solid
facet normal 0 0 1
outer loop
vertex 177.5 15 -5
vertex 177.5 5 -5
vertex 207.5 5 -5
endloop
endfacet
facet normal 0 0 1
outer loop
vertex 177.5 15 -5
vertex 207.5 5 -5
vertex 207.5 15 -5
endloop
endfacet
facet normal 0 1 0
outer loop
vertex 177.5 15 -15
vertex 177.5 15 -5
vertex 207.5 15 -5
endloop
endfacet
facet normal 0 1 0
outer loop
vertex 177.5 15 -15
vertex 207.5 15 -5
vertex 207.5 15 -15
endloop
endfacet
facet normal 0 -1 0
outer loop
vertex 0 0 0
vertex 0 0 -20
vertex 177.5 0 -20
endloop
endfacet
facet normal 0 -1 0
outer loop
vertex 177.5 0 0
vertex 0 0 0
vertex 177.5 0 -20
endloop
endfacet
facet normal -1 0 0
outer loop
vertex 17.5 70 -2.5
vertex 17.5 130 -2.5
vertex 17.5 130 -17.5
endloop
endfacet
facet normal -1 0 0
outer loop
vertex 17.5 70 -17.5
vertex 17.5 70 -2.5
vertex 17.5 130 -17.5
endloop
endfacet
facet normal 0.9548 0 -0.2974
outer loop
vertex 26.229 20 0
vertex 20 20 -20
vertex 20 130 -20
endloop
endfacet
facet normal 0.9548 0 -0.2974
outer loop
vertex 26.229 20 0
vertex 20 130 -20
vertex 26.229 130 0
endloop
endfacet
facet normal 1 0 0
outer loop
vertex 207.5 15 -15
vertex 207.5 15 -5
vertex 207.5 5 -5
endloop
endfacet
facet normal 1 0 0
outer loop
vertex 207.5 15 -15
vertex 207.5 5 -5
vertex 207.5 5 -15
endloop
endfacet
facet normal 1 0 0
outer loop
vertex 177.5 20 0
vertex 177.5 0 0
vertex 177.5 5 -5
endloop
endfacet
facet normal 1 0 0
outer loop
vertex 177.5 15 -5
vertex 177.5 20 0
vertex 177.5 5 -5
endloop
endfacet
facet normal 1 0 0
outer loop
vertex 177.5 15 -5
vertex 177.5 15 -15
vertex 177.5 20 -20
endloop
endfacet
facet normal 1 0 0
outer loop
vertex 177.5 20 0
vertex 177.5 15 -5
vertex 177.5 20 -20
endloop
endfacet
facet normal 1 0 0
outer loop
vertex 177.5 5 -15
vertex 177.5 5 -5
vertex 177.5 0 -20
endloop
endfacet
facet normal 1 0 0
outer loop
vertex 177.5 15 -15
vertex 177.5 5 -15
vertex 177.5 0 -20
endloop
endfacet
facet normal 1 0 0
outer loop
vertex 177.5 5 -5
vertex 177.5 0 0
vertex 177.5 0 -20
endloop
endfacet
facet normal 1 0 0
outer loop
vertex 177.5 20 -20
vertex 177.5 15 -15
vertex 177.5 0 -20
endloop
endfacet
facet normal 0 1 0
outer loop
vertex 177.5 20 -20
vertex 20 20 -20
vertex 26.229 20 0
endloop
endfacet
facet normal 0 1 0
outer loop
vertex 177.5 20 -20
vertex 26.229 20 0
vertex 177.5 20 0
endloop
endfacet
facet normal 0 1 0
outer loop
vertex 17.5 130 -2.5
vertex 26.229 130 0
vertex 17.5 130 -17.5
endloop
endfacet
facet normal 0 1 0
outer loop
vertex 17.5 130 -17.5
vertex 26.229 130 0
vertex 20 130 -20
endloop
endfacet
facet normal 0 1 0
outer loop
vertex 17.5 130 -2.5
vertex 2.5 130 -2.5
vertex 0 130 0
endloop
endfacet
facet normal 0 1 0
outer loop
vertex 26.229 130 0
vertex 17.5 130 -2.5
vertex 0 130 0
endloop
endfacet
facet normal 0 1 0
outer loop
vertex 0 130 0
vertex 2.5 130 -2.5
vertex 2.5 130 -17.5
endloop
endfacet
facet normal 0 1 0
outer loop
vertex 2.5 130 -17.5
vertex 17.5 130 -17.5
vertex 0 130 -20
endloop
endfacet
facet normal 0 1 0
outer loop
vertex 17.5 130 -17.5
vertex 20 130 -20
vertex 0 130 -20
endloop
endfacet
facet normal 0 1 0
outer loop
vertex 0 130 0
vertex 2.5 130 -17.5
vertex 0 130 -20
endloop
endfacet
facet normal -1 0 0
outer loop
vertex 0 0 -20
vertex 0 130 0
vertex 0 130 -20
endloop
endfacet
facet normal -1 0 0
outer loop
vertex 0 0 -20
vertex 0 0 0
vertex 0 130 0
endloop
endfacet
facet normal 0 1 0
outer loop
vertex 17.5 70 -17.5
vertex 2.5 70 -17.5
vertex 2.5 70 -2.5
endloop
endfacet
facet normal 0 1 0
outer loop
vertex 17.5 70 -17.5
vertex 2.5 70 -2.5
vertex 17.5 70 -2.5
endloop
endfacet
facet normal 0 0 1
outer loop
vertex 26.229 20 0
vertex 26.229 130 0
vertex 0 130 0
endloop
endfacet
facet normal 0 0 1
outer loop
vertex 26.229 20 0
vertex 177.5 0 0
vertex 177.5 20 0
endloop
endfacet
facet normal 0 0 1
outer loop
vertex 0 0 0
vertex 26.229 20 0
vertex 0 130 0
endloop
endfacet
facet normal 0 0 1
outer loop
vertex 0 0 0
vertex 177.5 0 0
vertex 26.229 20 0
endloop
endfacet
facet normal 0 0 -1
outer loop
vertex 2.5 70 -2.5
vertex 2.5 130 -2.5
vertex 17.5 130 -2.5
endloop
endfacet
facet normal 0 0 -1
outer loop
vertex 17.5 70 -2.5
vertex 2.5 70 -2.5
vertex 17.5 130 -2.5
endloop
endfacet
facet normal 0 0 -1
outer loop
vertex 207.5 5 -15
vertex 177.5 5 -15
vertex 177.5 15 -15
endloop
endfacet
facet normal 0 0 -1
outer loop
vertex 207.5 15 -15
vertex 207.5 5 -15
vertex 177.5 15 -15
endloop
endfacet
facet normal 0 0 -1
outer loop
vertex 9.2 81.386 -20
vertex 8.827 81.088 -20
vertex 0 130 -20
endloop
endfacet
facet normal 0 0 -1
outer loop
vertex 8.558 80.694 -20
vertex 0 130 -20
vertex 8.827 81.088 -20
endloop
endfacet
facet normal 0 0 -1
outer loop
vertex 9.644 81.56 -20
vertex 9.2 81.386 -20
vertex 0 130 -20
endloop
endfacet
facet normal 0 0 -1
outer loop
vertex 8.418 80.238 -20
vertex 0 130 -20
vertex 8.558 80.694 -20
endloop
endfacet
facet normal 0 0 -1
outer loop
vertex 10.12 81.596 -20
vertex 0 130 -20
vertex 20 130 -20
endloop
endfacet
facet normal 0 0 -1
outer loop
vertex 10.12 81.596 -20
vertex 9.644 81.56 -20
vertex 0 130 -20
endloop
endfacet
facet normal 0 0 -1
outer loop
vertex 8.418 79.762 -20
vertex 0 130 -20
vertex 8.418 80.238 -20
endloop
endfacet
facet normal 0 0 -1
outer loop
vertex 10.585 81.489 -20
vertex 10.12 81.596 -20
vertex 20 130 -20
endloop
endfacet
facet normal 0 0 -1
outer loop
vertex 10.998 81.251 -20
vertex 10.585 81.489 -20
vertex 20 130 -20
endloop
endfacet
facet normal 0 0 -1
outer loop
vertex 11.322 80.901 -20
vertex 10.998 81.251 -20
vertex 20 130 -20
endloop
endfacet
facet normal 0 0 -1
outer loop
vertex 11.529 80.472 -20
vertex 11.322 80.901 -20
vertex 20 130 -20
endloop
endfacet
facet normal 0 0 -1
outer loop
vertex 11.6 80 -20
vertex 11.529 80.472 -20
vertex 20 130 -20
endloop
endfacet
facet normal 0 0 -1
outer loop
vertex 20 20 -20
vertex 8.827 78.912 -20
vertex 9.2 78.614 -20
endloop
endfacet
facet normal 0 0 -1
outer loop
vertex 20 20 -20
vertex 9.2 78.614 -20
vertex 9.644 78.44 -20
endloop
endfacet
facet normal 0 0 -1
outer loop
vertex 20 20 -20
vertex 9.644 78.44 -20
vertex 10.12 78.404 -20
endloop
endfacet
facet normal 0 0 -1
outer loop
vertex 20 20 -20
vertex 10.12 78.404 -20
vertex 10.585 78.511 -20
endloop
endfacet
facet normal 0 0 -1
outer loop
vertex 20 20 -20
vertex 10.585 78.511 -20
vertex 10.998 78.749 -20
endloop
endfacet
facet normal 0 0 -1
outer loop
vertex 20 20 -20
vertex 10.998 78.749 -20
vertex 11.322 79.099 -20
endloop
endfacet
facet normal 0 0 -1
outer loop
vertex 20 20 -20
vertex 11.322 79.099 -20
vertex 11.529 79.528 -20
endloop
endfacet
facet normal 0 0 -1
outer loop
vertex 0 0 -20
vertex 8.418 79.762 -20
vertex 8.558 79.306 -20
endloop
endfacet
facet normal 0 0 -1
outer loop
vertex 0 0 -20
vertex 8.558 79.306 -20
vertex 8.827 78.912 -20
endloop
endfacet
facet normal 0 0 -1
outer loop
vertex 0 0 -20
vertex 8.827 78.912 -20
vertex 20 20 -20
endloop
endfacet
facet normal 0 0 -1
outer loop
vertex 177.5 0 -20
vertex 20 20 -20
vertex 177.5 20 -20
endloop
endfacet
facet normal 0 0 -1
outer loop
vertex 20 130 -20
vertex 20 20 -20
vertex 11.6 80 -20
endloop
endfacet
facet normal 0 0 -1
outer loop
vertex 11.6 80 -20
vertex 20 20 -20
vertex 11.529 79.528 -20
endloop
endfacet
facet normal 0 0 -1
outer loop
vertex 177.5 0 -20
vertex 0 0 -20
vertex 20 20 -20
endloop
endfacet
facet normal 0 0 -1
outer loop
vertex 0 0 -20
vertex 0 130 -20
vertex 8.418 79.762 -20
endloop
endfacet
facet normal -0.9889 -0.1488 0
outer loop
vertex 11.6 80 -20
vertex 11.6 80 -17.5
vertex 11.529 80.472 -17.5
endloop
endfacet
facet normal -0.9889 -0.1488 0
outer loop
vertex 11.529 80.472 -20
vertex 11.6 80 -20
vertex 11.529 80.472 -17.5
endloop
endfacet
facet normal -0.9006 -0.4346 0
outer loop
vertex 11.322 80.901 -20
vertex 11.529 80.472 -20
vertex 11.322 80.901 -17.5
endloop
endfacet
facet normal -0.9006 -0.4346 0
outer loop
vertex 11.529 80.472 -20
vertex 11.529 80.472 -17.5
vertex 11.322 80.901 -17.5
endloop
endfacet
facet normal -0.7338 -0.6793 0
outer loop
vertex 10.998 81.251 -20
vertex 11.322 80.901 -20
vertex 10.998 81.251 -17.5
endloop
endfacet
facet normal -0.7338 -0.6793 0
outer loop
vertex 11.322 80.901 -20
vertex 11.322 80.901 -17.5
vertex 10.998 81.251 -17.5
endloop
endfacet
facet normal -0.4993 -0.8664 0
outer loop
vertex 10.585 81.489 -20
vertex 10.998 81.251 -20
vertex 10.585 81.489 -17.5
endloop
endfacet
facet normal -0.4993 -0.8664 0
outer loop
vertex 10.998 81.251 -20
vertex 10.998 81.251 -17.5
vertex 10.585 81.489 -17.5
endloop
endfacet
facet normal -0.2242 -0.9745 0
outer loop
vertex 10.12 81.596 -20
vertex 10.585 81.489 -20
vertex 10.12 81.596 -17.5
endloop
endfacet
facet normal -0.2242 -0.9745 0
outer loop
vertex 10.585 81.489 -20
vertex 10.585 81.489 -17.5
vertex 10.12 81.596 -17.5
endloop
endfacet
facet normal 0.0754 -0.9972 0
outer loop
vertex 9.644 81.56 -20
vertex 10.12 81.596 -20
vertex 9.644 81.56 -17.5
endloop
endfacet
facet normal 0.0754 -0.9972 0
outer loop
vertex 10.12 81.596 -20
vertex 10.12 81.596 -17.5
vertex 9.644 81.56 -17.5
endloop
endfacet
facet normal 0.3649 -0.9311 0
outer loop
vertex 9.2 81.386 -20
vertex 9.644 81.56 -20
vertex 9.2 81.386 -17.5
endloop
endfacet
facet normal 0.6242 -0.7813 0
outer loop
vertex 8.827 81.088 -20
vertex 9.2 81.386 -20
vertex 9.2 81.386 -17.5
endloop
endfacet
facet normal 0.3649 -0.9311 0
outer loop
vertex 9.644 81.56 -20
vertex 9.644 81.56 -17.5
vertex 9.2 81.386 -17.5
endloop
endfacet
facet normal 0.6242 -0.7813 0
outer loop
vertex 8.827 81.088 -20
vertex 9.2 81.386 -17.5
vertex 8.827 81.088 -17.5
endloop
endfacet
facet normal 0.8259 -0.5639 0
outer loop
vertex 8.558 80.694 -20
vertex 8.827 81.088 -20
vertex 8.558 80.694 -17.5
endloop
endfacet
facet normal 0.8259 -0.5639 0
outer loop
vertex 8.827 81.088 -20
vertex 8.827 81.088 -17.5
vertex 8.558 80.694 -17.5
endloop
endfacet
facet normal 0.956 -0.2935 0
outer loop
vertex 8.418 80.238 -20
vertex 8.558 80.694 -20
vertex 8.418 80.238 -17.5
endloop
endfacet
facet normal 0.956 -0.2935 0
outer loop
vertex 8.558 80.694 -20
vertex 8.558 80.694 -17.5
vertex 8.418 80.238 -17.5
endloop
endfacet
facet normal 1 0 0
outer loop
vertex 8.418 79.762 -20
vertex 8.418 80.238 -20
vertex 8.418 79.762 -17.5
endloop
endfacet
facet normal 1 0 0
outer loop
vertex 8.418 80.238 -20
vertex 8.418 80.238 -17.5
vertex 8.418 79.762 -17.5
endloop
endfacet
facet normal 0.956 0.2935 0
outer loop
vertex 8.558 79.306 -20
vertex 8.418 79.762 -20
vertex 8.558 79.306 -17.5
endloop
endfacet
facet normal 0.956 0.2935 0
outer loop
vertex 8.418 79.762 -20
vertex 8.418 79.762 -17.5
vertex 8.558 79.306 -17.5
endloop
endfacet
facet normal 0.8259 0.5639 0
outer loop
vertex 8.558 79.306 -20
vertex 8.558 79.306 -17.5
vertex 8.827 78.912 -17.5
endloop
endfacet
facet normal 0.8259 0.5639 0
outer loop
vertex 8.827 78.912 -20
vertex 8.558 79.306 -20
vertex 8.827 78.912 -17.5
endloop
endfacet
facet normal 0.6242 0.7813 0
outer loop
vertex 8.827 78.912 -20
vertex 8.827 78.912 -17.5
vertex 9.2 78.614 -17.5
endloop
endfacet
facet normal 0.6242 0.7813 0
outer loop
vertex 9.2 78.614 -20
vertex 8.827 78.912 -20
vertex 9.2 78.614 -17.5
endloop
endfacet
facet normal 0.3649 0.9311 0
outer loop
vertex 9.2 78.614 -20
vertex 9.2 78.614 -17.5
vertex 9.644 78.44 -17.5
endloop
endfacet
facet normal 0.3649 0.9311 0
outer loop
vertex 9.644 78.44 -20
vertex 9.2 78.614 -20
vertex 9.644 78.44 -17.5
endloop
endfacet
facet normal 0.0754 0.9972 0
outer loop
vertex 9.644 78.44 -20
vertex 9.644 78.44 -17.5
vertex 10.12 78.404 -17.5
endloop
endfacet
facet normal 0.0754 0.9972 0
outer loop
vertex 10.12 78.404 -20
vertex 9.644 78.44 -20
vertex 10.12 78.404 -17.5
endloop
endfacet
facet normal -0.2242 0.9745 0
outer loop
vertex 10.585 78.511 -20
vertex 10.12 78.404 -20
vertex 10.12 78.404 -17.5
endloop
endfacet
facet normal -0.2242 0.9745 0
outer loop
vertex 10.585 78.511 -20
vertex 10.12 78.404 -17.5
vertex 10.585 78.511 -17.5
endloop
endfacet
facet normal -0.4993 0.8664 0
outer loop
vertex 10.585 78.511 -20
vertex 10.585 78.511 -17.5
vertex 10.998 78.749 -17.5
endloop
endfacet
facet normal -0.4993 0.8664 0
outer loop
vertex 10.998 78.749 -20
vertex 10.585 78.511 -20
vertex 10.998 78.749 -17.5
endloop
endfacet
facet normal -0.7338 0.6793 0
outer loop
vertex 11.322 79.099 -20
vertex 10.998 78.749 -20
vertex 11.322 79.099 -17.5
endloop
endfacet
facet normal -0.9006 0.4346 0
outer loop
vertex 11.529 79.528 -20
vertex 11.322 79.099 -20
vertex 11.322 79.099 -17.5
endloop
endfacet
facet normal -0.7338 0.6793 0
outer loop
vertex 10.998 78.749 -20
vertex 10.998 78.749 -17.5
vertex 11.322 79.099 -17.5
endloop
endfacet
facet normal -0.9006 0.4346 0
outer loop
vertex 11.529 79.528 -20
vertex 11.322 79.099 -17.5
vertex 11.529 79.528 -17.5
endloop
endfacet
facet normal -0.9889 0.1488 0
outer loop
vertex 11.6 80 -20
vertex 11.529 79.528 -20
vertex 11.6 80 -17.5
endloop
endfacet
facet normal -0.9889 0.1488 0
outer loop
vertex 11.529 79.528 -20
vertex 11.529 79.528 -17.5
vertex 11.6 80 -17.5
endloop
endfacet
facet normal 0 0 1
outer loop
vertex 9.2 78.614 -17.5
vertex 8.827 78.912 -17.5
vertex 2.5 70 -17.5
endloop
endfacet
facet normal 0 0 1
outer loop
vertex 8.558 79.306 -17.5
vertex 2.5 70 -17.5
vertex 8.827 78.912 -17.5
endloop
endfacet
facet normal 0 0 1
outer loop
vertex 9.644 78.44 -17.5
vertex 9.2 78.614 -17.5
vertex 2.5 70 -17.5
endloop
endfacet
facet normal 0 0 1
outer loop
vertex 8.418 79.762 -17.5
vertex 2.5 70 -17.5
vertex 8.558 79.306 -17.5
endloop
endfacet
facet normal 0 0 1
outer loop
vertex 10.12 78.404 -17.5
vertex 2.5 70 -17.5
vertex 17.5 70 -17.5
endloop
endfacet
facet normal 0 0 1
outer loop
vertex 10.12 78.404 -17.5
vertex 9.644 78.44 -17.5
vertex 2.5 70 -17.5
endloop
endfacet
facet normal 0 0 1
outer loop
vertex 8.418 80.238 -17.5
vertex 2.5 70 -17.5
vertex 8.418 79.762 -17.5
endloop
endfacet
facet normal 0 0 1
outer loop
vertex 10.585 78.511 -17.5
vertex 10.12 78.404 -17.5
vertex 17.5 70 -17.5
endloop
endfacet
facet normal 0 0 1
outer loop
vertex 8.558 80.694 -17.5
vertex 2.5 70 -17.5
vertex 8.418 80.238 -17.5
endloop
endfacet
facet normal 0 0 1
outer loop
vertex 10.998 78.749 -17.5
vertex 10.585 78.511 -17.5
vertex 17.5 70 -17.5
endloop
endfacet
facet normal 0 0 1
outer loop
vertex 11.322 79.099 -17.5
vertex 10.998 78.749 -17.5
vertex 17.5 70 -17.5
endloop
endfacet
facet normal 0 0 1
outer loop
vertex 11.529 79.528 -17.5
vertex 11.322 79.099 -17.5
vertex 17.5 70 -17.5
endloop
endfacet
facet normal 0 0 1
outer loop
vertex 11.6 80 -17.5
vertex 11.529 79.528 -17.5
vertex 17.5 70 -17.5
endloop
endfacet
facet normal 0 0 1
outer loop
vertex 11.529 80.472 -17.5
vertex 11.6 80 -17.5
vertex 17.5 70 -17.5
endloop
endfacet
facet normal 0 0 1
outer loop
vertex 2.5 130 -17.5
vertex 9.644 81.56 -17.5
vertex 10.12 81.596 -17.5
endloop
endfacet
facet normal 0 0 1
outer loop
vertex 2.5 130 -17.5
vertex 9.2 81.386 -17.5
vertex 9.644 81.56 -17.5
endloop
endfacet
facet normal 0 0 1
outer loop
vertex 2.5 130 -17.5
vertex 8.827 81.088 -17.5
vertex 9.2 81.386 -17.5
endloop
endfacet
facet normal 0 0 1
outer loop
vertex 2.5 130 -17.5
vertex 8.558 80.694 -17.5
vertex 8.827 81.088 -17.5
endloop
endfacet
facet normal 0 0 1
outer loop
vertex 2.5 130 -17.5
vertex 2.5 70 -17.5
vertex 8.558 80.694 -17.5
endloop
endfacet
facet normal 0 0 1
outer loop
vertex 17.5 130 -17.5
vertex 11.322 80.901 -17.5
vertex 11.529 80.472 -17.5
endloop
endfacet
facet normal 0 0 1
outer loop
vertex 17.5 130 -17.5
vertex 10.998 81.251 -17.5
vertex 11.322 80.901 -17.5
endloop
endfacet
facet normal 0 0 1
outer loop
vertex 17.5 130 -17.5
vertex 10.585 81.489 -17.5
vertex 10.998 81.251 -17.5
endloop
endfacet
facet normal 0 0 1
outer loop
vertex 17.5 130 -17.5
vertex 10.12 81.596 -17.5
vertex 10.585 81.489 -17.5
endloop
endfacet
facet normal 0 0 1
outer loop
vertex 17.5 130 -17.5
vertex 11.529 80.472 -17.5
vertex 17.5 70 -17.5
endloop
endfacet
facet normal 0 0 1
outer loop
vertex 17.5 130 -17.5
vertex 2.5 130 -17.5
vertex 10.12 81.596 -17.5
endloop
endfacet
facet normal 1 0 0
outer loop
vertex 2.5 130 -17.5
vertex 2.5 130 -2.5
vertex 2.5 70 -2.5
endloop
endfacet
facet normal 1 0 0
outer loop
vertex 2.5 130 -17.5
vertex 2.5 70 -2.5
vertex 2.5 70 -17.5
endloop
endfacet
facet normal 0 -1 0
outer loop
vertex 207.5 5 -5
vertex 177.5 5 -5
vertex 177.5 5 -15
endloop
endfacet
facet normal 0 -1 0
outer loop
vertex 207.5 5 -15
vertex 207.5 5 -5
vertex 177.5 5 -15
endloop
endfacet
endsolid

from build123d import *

# Parameters (mm, degrees)
ESQUISSE2_W             = 177.5
ESQUISSE2_H             = 20
BOSS_EXTRU_1_DEPTH      = 20
BOSS_EXTRU_3_DEPTH      = 110
ESQUISSE5_W             = 10
ESQUISSE5_H             = 10
BOSS_EXTRU_4_DEPTH      = 30
D_GAGEMENT_M31_D        = 3.2
D_GAGEMENT_M31_DEPTH    = 10
D_GAGEMENT_M31_TIP      = 0.96137699
ESQUISSE8_W             = 15
ESQUISSE8_H             = 15
ENL_V_MAT_EXTRU_1_DEPTH = 60


with BuildPart() as part:
    # Esquisse2 → Boss.-Extru.1 (new body)
    with BuildSketch(Plane(origin=(0, 0, 0), x_dir=(1, 0, 0), z_dir=(0, 1, 0))):
        with Locations((88.75, 10)):
            Rectangle(ESQUISSE2_W, ESQUISSE2_H)
    extrude(amount=BOSS_EXTRU_1_DEPTH)

    # Esquisse4 → Boss.-Extru.3 (add)
    with BuildSketch(Plane(origin=(0, 20, 0), x_dir=(1, 0, 0), z_dir=(0, 1, 0))):
        Polygon((0, 20), (20, 20), (26.229306319, 0), (0, 0), align=None)
    extrude(amount=BOSS_EXTRU_3_DEPTH)

    # Esquisse5 → Boss.-Extru.4 (add)
    with BuildSketch(Plane(origin=(177.5, 0, 0), x_dir=(0, 0, -1), z_dir=(1, 0, 0))):
        with Locations((10, 10)):
            Rectangle(ESQUISSE5_W, ESQUISSE5_H)
    extrude(amount=BOSS_EXTRU_4_DEPTH)

    # Dégagement M31
    with Locations(Plane(origin=(10, 80, -20), x_dir=(-1, 0, 0), z_dir=(0, 0, -1))):
        with Locations((0, 0)):
            Hole(D_GAGEMENT_M31_D / 2, depth=D_GAGEMENT_M31_DEPTH)
            with Locations((0, 0, -(D_GAGEMENT_M31_DEPTH + D_GAGEMENT_M31_TIP / 2))):  # 118° drill point
                Cone(0, D_GAGEMENT_M31_D / 2, D_GAGEMENT_M31_TIP, mode=Mode.SUBTRACT)

    # Esquisse8 → Enlèv. mat.-Extru.1 (cut)
    with BuildSketch(Plane(origin=(0, 130, 0), x_dir=(1, 0, 0), z_dir=(0, 1, 0))):
        with Locations((10, 10)):
            Rectangle(ESQUISSE8_W, ESQUISSE8_H)
    extrude(amount=-ENL_V_MAT_EXTRU_1_DEPTH, mode=Mode.SUBTRACT)


solid = part.part
